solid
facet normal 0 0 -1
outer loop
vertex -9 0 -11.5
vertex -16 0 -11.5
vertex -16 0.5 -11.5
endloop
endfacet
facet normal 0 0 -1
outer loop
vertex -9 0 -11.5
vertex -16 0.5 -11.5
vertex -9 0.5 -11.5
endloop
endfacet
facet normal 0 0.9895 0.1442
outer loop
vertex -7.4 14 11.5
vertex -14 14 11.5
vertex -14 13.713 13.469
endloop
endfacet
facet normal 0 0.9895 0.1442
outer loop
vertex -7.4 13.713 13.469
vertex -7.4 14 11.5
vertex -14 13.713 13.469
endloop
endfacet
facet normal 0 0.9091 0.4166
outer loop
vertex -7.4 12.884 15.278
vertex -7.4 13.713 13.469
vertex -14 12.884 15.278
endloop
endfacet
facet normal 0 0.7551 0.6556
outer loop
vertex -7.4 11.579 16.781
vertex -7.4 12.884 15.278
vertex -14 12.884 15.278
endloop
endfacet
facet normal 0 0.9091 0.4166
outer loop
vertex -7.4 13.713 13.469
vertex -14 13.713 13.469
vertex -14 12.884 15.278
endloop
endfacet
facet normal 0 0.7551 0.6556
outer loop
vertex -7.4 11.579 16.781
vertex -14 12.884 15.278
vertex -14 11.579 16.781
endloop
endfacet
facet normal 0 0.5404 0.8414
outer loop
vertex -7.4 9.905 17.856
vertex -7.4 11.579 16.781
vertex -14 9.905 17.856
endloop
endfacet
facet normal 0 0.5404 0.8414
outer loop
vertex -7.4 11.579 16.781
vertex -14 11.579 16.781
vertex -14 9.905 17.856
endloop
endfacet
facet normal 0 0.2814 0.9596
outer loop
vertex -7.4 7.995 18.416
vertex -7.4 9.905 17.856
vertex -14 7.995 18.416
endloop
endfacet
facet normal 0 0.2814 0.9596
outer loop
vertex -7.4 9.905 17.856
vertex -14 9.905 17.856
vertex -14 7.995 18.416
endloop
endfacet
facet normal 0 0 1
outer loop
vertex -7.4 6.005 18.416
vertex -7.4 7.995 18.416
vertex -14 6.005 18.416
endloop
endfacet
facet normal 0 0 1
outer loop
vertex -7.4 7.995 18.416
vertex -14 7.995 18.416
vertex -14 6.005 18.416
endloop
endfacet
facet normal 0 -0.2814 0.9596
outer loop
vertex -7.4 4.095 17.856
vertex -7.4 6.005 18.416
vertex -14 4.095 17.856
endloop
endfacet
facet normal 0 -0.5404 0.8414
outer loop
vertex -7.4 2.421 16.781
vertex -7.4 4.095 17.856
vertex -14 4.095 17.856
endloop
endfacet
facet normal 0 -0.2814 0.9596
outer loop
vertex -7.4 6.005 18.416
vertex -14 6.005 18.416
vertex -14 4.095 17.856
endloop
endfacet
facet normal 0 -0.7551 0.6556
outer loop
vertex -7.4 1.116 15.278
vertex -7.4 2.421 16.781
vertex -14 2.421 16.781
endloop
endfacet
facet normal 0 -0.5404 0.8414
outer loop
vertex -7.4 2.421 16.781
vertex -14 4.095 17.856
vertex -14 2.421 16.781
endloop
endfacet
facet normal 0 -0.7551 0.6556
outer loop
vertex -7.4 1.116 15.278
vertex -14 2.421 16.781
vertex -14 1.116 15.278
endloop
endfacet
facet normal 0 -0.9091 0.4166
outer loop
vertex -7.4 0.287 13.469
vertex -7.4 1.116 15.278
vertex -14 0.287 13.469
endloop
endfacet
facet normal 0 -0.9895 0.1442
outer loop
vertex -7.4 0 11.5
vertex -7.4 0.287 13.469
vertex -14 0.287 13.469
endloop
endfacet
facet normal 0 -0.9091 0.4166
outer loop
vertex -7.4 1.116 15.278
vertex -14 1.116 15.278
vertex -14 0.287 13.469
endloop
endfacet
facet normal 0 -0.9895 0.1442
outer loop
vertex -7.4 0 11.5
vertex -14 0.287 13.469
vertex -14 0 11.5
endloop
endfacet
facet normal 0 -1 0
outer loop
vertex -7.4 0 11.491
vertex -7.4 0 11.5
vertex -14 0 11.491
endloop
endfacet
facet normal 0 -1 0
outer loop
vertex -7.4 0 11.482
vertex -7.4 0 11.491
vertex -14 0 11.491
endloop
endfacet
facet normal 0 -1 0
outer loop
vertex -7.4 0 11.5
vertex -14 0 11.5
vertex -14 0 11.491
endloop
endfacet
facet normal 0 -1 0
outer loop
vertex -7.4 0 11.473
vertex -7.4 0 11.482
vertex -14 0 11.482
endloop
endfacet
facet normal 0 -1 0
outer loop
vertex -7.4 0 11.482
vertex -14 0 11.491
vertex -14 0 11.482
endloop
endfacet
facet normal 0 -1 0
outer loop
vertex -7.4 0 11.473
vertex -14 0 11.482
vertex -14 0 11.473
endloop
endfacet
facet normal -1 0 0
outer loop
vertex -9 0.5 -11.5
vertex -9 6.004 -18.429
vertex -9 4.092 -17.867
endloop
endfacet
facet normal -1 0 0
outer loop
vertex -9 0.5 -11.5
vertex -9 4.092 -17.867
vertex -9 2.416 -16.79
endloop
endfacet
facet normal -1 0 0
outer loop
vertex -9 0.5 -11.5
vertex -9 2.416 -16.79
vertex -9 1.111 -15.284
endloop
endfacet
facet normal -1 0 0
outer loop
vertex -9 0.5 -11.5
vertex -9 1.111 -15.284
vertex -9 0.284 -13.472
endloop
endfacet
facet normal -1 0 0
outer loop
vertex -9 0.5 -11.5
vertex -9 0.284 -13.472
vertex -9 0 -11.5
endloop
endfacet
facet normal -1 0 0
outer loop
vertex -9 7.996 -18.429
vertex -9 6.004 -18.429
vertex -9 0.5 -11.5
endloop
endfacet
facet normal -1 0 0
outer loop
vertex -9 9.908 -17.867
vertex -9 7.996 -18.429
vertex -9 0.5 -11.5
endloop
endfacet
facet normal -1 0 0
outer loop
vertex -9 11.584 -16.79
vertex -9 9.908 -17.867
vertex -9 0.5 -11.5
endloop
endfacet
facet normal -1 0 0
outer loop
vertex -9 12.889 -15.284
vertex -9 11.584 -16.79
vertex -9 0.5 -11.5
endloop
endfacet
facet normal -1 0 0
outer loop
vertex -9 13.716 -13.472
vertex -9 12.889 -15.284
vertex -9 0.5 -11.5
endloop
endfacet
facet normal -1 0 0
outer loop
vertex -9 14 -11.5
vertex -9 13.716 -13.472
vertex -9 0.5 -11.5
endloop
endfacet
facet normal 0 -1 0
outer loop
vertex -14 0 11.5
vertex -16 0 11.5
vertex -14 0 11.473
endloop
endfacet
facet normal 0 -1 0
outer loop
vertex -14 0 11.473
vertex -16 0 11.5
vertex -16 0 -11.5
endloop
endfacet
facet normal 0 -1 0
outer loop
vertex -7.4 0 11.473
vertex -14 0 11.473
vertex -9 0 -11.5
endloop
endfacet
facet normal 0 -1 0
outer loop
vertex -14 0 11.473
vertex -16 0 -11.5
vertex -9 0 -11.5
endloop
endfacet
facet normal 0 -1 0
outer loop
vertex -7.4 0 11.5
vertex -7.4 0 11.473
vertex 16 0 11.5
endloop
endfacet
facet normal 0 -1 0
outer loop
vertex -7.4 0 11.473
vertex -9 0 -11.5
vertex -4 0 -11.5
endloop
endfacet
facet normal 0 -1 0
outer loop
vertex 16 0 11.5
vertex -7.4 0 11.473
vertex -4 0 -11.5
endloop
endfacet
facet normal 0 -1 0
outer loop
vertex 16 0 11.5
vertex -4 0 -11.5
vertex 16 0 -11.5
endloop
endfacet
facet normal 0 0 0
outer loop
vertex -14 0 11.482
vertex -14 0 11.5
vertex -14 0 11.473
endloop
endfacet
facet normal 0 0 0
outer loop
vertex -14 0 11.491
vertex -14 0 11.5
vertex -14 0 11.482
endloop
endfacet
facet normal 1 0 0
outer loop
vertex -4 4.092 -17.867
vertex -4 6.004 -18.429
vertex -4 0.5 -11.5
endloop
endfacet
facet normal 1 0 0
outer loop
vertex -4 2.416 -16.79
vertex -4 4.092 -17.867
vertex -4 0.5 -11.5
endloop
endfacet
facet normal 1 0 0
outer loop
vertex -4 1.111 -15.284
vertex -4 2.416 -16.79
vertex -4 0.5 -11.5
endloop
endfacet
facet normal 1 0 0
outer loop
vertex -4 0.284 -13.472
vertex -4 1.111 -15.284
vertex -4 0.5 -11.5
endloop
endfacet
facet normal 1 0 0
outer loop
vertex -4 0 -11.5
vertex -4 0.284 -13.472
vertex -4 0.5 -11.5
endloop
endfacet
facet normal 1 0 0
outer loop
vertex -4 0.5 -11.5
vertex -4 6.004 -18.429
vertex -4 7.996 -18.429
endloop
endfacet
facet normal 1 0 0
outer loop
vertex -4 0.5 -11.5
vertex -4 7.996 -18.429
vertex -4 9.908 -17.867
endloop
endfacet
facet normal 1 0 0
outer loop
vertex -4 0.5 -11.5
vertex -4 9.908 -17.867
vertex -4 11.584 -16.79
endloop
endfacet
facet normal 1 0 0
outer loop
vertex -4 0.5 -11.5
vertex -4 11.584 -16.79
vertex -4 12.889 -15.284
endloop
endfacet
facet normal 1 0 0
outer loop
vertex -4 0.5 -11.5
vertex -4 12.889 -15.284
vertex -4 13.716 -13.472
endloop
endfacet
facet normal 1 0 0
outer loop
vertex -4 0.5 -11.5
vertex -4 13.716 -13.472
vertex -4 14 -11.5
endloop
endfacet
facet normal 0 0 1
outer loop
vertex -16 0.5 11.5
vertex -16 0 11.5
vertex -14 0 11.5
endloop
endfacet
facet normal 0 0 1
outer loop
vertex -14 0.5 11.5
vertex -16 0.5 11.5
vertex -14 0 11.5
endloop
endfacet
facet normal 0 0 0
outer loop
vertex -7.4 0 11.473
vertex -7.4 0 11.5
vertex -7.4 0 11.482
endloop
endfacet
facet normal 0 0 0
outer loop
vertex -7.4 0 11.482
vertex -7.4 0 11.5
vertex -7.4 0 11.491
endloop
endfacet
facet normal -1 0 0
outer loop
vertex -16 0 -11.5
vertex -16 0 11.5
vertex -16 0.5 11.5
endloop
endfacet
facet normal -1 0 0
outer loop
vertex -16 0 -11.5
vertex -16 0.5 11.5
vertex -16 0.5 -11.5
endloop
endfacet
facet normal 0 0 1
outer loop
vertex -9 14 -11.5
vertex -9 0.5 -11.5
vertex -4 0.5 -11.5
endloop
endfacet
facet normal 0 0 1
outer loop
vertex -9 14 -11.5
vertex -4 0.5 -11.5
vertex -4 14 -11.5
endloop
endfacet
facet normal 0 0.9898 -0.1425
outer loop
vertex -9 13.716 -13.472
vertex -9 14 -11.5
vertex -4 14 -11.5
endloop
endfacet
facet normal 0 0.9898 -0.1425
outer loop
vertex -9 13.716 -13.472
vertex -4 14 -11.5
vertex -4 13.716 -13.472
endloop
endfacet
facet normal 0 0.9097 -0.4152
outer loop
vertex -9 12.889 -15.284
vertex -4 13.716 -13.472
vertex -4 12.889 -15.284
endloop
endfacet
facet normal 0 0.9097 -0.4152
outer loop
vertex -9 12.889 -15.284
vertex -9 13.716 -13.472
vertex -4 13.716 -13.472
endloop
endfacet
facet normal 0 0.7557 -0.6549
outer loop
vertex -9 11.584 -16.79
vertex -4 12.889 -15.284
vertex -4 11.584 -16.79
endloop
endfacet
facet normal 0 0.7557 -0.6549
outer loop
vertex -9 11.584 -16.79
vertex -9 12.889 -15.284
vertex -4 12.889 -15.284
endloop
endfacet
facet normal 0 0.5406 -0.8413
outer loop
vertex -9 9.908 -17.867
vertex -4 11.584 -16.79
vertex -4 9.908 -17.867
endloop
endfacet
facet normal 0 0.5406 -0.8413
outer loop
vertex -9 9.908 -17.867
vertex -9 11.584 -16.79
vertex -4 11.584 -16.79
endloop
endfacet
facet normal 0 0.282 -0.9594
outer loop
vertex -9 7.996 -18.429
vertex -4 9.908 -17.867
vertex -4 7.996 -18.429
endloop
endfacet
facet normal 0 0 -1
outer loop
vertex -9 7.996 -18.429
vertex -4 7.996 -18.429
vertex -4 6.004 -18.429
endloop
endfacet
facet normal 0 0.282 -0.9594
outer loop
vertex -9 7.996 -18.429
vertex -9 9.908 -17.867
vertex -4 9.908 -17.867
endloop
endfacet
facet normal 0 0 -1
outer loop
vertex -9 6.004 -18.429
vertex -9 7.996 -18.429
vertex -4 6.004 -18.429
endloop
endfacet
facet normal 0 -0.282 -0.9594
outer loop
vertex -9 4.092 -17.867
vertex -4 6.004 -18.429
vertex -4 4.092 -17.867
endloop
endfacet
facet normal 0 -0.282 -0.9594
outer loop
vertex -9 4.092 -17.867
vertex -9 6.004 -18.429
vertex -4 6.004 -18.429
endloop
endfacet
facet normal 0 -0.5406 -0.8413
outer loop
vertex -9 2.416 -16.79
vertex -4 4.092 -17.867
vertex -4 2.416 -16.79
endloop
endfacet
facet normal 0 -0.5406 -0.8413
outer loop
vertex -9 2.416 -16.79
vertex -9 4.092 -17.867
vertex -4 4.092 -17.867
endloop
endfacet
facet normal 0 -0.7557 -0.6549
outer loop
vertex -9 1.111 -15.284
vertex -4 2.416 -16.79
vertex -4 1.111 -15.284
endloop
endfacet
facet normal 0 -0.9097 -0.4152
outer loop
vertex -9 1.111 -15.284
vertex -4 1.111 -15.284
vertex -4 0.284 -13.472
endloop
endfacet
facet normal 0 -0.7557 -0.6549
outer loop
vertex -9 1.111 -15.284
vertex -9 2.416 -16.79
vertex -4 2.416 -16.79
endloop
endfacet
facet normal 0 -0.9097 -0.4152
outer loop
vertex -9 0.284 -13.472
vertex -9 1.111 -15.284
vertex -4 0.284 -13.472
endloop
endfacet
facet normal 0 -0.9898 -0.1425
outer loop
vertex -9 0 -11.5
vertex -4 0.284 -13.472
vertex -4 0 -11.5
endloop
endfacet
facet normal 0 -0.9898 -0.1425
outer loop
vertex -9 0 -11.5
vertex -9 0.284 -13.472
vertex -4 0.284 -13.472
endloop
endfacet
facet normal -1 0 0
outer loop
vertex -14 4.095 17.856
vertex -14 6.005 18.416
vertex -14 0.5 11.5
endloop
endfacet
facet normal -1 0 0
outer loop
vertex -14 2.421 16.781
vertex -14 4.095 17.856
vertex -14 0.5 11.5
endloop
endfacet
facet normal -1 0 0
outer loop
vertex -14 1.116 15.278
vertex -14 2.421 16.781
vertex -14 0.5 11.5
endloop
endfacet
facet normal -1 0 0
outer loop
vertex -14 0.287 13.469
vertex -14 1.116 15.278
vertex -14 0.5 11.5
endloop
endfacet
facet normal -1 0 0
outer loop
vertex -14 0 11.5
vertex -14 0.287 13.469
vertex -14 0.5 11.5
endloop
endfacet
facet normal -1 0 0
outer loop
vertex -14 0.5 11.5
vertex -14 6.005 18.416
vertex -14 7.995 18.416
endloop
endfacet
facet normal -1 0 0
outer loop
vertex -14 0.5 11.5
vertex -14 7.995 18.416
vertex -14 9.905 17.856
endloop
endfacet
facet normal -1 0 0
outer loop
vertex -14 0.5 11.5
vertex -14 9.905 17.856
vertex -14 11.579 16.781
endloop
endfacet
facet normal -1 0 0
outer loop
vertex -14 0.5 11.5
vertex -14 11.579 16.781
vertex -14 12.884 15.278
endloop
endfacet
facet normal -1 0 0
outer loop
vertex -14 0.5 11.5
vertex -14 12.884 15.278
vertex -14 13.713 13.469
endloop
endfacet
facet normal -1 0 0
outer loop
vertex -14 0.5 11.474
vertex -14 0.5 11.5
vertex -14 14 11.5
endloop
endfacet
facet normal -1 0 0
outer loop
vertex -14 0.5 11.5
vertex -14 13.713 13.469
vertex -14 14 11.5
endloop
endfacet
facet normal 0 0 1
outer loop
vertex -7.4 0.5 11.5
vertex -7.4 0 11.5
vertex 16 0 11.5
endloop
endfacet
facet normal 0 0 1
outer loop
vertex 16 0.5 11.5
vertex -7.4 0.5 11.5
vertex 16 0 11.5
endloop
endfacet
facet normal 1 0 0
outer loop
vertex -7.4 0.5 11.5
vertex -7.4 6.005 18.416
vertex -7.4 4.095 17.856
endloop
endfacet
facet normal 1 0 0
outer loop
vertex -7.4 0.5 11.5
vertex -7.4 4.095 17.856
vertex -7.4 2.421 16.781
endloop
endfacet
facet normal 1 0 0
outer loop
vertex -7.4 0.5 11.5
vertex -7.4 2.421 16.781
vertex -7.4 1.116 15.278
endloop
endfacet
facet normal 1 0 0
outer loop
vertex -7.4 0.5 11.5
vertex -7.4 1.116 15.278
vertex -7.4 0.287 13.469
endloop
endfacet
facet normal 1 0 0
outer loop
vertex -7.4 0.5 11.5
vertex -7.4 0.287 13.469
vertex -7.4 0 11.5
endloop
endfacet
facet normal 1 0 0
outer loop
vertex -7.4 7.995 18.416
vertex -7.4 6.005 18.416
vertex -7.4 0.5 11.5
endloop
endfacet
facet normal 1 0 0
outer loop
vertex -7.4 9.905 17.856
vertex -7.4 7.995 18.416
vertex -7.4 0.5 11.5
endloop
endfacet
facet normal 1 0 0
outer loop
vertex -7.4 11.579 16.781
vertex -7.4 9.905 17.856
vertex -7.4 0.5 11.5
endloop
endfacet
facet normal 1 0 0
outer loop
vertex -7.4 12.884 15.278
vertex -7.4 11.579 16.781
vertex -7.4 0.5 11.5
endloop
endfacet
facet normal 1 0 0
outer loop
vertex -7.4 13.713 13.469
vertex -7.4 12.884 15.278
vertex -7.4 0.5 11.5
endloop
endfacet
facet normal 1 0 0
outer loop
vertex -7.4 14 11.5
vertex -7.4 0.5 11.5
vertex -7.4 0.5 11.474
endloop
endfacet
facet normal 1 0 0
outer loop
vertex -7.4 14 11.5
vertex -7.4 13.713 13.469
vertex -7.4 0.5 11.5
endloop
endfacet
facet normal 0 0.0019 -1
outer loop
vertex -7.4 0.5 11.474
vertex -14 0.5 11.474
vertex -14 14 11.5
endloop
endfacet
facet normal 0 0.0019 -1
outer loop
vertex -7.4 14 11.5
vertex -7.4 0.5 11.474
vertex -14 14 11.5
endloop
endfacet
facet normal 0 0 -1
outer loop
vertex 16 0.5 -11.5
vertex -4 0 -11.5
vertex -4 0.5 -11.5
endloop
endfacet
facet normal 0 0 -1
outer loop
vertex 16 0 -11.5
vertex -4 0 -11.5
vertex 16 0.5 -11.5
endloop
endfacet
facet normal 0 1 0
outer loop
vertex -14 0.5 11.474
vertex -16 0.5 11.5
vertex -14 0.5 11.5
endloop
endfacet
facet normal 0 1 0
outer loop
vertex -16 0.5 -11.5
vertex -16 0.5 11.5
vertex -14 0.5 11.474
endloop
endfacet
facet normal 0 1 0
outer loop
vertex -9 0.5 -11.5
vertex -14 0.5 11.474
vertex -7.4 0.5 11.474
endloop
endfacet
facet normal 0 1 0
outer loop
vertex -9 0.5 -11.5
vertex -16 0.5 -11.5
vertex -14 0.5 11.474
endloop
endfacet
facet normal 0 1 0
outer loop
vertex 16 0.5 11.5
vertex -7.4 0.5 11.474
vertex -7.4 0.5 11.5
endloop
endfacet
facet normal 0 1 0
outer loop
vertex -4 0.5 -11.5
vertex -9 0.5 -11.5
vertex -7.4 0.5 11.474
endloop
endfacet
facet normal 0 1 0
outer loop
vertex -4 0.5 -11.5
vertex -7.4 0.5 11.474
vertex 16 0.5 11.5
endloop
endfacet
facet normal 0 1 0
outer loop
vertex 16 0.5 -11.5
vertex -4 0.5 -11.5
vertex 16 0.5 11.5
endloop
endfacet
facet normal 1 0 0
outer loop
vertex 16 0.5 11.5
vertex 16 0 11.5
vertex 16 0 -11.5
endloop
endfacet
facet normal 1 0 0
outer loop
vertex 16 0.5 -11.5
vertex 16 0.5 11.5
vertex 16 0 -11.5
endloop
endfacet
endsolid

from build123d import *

# Parameters (mm, degrees)
SKETCH_1_W      = 32
SKETCH_1_H      = 23
EXTRUDE_1_DEPTH = 0.5
EXTRUDE_3_DEPTH = 5
EXTRUDE_4_DEPTH = 6.6


with BuildPart() as part:
    # 草图1 → 凸台-拉伸1 (new body)
    with BuildSketch(Plane(origin=(0, 0, 0), x_dir=(1, 0, 0), z_dir=(0, 1, 0))):
        Rectangle(SKETCH_1_W, SKETCH_1_H)
    extrude(amount=EXTRUDE_1_DEPTH)

    # 草图5 → 凸台-拉伸3 (add)
    with BuildSketch(Plane.ZY.offset(9)):
        with BuildLine():
            Line((-11.5, 0), (-11.5, 14))
            ThreePointArc((-11.5, 14), (-18.5, 7), (-11.5, 0))
        make_face()
    extrude(amount=-EXTRUDE_3_DEPTH)

    # 草图7 → 凸台-拉伸4 (add)
    with BuildSketch(Plane.ZY.offset(14)):
        with BuildLine():
            Line((11.473319553, 0), (11.5, 13.999974577))
            ThreePointArc((11.5, 13.999974577), (18.486647065, 6.986647065), (11.473319553, 0))
        make_face()
    extrude(amount=-EXTRUDE_4_DEPTH)


solid = part.part
